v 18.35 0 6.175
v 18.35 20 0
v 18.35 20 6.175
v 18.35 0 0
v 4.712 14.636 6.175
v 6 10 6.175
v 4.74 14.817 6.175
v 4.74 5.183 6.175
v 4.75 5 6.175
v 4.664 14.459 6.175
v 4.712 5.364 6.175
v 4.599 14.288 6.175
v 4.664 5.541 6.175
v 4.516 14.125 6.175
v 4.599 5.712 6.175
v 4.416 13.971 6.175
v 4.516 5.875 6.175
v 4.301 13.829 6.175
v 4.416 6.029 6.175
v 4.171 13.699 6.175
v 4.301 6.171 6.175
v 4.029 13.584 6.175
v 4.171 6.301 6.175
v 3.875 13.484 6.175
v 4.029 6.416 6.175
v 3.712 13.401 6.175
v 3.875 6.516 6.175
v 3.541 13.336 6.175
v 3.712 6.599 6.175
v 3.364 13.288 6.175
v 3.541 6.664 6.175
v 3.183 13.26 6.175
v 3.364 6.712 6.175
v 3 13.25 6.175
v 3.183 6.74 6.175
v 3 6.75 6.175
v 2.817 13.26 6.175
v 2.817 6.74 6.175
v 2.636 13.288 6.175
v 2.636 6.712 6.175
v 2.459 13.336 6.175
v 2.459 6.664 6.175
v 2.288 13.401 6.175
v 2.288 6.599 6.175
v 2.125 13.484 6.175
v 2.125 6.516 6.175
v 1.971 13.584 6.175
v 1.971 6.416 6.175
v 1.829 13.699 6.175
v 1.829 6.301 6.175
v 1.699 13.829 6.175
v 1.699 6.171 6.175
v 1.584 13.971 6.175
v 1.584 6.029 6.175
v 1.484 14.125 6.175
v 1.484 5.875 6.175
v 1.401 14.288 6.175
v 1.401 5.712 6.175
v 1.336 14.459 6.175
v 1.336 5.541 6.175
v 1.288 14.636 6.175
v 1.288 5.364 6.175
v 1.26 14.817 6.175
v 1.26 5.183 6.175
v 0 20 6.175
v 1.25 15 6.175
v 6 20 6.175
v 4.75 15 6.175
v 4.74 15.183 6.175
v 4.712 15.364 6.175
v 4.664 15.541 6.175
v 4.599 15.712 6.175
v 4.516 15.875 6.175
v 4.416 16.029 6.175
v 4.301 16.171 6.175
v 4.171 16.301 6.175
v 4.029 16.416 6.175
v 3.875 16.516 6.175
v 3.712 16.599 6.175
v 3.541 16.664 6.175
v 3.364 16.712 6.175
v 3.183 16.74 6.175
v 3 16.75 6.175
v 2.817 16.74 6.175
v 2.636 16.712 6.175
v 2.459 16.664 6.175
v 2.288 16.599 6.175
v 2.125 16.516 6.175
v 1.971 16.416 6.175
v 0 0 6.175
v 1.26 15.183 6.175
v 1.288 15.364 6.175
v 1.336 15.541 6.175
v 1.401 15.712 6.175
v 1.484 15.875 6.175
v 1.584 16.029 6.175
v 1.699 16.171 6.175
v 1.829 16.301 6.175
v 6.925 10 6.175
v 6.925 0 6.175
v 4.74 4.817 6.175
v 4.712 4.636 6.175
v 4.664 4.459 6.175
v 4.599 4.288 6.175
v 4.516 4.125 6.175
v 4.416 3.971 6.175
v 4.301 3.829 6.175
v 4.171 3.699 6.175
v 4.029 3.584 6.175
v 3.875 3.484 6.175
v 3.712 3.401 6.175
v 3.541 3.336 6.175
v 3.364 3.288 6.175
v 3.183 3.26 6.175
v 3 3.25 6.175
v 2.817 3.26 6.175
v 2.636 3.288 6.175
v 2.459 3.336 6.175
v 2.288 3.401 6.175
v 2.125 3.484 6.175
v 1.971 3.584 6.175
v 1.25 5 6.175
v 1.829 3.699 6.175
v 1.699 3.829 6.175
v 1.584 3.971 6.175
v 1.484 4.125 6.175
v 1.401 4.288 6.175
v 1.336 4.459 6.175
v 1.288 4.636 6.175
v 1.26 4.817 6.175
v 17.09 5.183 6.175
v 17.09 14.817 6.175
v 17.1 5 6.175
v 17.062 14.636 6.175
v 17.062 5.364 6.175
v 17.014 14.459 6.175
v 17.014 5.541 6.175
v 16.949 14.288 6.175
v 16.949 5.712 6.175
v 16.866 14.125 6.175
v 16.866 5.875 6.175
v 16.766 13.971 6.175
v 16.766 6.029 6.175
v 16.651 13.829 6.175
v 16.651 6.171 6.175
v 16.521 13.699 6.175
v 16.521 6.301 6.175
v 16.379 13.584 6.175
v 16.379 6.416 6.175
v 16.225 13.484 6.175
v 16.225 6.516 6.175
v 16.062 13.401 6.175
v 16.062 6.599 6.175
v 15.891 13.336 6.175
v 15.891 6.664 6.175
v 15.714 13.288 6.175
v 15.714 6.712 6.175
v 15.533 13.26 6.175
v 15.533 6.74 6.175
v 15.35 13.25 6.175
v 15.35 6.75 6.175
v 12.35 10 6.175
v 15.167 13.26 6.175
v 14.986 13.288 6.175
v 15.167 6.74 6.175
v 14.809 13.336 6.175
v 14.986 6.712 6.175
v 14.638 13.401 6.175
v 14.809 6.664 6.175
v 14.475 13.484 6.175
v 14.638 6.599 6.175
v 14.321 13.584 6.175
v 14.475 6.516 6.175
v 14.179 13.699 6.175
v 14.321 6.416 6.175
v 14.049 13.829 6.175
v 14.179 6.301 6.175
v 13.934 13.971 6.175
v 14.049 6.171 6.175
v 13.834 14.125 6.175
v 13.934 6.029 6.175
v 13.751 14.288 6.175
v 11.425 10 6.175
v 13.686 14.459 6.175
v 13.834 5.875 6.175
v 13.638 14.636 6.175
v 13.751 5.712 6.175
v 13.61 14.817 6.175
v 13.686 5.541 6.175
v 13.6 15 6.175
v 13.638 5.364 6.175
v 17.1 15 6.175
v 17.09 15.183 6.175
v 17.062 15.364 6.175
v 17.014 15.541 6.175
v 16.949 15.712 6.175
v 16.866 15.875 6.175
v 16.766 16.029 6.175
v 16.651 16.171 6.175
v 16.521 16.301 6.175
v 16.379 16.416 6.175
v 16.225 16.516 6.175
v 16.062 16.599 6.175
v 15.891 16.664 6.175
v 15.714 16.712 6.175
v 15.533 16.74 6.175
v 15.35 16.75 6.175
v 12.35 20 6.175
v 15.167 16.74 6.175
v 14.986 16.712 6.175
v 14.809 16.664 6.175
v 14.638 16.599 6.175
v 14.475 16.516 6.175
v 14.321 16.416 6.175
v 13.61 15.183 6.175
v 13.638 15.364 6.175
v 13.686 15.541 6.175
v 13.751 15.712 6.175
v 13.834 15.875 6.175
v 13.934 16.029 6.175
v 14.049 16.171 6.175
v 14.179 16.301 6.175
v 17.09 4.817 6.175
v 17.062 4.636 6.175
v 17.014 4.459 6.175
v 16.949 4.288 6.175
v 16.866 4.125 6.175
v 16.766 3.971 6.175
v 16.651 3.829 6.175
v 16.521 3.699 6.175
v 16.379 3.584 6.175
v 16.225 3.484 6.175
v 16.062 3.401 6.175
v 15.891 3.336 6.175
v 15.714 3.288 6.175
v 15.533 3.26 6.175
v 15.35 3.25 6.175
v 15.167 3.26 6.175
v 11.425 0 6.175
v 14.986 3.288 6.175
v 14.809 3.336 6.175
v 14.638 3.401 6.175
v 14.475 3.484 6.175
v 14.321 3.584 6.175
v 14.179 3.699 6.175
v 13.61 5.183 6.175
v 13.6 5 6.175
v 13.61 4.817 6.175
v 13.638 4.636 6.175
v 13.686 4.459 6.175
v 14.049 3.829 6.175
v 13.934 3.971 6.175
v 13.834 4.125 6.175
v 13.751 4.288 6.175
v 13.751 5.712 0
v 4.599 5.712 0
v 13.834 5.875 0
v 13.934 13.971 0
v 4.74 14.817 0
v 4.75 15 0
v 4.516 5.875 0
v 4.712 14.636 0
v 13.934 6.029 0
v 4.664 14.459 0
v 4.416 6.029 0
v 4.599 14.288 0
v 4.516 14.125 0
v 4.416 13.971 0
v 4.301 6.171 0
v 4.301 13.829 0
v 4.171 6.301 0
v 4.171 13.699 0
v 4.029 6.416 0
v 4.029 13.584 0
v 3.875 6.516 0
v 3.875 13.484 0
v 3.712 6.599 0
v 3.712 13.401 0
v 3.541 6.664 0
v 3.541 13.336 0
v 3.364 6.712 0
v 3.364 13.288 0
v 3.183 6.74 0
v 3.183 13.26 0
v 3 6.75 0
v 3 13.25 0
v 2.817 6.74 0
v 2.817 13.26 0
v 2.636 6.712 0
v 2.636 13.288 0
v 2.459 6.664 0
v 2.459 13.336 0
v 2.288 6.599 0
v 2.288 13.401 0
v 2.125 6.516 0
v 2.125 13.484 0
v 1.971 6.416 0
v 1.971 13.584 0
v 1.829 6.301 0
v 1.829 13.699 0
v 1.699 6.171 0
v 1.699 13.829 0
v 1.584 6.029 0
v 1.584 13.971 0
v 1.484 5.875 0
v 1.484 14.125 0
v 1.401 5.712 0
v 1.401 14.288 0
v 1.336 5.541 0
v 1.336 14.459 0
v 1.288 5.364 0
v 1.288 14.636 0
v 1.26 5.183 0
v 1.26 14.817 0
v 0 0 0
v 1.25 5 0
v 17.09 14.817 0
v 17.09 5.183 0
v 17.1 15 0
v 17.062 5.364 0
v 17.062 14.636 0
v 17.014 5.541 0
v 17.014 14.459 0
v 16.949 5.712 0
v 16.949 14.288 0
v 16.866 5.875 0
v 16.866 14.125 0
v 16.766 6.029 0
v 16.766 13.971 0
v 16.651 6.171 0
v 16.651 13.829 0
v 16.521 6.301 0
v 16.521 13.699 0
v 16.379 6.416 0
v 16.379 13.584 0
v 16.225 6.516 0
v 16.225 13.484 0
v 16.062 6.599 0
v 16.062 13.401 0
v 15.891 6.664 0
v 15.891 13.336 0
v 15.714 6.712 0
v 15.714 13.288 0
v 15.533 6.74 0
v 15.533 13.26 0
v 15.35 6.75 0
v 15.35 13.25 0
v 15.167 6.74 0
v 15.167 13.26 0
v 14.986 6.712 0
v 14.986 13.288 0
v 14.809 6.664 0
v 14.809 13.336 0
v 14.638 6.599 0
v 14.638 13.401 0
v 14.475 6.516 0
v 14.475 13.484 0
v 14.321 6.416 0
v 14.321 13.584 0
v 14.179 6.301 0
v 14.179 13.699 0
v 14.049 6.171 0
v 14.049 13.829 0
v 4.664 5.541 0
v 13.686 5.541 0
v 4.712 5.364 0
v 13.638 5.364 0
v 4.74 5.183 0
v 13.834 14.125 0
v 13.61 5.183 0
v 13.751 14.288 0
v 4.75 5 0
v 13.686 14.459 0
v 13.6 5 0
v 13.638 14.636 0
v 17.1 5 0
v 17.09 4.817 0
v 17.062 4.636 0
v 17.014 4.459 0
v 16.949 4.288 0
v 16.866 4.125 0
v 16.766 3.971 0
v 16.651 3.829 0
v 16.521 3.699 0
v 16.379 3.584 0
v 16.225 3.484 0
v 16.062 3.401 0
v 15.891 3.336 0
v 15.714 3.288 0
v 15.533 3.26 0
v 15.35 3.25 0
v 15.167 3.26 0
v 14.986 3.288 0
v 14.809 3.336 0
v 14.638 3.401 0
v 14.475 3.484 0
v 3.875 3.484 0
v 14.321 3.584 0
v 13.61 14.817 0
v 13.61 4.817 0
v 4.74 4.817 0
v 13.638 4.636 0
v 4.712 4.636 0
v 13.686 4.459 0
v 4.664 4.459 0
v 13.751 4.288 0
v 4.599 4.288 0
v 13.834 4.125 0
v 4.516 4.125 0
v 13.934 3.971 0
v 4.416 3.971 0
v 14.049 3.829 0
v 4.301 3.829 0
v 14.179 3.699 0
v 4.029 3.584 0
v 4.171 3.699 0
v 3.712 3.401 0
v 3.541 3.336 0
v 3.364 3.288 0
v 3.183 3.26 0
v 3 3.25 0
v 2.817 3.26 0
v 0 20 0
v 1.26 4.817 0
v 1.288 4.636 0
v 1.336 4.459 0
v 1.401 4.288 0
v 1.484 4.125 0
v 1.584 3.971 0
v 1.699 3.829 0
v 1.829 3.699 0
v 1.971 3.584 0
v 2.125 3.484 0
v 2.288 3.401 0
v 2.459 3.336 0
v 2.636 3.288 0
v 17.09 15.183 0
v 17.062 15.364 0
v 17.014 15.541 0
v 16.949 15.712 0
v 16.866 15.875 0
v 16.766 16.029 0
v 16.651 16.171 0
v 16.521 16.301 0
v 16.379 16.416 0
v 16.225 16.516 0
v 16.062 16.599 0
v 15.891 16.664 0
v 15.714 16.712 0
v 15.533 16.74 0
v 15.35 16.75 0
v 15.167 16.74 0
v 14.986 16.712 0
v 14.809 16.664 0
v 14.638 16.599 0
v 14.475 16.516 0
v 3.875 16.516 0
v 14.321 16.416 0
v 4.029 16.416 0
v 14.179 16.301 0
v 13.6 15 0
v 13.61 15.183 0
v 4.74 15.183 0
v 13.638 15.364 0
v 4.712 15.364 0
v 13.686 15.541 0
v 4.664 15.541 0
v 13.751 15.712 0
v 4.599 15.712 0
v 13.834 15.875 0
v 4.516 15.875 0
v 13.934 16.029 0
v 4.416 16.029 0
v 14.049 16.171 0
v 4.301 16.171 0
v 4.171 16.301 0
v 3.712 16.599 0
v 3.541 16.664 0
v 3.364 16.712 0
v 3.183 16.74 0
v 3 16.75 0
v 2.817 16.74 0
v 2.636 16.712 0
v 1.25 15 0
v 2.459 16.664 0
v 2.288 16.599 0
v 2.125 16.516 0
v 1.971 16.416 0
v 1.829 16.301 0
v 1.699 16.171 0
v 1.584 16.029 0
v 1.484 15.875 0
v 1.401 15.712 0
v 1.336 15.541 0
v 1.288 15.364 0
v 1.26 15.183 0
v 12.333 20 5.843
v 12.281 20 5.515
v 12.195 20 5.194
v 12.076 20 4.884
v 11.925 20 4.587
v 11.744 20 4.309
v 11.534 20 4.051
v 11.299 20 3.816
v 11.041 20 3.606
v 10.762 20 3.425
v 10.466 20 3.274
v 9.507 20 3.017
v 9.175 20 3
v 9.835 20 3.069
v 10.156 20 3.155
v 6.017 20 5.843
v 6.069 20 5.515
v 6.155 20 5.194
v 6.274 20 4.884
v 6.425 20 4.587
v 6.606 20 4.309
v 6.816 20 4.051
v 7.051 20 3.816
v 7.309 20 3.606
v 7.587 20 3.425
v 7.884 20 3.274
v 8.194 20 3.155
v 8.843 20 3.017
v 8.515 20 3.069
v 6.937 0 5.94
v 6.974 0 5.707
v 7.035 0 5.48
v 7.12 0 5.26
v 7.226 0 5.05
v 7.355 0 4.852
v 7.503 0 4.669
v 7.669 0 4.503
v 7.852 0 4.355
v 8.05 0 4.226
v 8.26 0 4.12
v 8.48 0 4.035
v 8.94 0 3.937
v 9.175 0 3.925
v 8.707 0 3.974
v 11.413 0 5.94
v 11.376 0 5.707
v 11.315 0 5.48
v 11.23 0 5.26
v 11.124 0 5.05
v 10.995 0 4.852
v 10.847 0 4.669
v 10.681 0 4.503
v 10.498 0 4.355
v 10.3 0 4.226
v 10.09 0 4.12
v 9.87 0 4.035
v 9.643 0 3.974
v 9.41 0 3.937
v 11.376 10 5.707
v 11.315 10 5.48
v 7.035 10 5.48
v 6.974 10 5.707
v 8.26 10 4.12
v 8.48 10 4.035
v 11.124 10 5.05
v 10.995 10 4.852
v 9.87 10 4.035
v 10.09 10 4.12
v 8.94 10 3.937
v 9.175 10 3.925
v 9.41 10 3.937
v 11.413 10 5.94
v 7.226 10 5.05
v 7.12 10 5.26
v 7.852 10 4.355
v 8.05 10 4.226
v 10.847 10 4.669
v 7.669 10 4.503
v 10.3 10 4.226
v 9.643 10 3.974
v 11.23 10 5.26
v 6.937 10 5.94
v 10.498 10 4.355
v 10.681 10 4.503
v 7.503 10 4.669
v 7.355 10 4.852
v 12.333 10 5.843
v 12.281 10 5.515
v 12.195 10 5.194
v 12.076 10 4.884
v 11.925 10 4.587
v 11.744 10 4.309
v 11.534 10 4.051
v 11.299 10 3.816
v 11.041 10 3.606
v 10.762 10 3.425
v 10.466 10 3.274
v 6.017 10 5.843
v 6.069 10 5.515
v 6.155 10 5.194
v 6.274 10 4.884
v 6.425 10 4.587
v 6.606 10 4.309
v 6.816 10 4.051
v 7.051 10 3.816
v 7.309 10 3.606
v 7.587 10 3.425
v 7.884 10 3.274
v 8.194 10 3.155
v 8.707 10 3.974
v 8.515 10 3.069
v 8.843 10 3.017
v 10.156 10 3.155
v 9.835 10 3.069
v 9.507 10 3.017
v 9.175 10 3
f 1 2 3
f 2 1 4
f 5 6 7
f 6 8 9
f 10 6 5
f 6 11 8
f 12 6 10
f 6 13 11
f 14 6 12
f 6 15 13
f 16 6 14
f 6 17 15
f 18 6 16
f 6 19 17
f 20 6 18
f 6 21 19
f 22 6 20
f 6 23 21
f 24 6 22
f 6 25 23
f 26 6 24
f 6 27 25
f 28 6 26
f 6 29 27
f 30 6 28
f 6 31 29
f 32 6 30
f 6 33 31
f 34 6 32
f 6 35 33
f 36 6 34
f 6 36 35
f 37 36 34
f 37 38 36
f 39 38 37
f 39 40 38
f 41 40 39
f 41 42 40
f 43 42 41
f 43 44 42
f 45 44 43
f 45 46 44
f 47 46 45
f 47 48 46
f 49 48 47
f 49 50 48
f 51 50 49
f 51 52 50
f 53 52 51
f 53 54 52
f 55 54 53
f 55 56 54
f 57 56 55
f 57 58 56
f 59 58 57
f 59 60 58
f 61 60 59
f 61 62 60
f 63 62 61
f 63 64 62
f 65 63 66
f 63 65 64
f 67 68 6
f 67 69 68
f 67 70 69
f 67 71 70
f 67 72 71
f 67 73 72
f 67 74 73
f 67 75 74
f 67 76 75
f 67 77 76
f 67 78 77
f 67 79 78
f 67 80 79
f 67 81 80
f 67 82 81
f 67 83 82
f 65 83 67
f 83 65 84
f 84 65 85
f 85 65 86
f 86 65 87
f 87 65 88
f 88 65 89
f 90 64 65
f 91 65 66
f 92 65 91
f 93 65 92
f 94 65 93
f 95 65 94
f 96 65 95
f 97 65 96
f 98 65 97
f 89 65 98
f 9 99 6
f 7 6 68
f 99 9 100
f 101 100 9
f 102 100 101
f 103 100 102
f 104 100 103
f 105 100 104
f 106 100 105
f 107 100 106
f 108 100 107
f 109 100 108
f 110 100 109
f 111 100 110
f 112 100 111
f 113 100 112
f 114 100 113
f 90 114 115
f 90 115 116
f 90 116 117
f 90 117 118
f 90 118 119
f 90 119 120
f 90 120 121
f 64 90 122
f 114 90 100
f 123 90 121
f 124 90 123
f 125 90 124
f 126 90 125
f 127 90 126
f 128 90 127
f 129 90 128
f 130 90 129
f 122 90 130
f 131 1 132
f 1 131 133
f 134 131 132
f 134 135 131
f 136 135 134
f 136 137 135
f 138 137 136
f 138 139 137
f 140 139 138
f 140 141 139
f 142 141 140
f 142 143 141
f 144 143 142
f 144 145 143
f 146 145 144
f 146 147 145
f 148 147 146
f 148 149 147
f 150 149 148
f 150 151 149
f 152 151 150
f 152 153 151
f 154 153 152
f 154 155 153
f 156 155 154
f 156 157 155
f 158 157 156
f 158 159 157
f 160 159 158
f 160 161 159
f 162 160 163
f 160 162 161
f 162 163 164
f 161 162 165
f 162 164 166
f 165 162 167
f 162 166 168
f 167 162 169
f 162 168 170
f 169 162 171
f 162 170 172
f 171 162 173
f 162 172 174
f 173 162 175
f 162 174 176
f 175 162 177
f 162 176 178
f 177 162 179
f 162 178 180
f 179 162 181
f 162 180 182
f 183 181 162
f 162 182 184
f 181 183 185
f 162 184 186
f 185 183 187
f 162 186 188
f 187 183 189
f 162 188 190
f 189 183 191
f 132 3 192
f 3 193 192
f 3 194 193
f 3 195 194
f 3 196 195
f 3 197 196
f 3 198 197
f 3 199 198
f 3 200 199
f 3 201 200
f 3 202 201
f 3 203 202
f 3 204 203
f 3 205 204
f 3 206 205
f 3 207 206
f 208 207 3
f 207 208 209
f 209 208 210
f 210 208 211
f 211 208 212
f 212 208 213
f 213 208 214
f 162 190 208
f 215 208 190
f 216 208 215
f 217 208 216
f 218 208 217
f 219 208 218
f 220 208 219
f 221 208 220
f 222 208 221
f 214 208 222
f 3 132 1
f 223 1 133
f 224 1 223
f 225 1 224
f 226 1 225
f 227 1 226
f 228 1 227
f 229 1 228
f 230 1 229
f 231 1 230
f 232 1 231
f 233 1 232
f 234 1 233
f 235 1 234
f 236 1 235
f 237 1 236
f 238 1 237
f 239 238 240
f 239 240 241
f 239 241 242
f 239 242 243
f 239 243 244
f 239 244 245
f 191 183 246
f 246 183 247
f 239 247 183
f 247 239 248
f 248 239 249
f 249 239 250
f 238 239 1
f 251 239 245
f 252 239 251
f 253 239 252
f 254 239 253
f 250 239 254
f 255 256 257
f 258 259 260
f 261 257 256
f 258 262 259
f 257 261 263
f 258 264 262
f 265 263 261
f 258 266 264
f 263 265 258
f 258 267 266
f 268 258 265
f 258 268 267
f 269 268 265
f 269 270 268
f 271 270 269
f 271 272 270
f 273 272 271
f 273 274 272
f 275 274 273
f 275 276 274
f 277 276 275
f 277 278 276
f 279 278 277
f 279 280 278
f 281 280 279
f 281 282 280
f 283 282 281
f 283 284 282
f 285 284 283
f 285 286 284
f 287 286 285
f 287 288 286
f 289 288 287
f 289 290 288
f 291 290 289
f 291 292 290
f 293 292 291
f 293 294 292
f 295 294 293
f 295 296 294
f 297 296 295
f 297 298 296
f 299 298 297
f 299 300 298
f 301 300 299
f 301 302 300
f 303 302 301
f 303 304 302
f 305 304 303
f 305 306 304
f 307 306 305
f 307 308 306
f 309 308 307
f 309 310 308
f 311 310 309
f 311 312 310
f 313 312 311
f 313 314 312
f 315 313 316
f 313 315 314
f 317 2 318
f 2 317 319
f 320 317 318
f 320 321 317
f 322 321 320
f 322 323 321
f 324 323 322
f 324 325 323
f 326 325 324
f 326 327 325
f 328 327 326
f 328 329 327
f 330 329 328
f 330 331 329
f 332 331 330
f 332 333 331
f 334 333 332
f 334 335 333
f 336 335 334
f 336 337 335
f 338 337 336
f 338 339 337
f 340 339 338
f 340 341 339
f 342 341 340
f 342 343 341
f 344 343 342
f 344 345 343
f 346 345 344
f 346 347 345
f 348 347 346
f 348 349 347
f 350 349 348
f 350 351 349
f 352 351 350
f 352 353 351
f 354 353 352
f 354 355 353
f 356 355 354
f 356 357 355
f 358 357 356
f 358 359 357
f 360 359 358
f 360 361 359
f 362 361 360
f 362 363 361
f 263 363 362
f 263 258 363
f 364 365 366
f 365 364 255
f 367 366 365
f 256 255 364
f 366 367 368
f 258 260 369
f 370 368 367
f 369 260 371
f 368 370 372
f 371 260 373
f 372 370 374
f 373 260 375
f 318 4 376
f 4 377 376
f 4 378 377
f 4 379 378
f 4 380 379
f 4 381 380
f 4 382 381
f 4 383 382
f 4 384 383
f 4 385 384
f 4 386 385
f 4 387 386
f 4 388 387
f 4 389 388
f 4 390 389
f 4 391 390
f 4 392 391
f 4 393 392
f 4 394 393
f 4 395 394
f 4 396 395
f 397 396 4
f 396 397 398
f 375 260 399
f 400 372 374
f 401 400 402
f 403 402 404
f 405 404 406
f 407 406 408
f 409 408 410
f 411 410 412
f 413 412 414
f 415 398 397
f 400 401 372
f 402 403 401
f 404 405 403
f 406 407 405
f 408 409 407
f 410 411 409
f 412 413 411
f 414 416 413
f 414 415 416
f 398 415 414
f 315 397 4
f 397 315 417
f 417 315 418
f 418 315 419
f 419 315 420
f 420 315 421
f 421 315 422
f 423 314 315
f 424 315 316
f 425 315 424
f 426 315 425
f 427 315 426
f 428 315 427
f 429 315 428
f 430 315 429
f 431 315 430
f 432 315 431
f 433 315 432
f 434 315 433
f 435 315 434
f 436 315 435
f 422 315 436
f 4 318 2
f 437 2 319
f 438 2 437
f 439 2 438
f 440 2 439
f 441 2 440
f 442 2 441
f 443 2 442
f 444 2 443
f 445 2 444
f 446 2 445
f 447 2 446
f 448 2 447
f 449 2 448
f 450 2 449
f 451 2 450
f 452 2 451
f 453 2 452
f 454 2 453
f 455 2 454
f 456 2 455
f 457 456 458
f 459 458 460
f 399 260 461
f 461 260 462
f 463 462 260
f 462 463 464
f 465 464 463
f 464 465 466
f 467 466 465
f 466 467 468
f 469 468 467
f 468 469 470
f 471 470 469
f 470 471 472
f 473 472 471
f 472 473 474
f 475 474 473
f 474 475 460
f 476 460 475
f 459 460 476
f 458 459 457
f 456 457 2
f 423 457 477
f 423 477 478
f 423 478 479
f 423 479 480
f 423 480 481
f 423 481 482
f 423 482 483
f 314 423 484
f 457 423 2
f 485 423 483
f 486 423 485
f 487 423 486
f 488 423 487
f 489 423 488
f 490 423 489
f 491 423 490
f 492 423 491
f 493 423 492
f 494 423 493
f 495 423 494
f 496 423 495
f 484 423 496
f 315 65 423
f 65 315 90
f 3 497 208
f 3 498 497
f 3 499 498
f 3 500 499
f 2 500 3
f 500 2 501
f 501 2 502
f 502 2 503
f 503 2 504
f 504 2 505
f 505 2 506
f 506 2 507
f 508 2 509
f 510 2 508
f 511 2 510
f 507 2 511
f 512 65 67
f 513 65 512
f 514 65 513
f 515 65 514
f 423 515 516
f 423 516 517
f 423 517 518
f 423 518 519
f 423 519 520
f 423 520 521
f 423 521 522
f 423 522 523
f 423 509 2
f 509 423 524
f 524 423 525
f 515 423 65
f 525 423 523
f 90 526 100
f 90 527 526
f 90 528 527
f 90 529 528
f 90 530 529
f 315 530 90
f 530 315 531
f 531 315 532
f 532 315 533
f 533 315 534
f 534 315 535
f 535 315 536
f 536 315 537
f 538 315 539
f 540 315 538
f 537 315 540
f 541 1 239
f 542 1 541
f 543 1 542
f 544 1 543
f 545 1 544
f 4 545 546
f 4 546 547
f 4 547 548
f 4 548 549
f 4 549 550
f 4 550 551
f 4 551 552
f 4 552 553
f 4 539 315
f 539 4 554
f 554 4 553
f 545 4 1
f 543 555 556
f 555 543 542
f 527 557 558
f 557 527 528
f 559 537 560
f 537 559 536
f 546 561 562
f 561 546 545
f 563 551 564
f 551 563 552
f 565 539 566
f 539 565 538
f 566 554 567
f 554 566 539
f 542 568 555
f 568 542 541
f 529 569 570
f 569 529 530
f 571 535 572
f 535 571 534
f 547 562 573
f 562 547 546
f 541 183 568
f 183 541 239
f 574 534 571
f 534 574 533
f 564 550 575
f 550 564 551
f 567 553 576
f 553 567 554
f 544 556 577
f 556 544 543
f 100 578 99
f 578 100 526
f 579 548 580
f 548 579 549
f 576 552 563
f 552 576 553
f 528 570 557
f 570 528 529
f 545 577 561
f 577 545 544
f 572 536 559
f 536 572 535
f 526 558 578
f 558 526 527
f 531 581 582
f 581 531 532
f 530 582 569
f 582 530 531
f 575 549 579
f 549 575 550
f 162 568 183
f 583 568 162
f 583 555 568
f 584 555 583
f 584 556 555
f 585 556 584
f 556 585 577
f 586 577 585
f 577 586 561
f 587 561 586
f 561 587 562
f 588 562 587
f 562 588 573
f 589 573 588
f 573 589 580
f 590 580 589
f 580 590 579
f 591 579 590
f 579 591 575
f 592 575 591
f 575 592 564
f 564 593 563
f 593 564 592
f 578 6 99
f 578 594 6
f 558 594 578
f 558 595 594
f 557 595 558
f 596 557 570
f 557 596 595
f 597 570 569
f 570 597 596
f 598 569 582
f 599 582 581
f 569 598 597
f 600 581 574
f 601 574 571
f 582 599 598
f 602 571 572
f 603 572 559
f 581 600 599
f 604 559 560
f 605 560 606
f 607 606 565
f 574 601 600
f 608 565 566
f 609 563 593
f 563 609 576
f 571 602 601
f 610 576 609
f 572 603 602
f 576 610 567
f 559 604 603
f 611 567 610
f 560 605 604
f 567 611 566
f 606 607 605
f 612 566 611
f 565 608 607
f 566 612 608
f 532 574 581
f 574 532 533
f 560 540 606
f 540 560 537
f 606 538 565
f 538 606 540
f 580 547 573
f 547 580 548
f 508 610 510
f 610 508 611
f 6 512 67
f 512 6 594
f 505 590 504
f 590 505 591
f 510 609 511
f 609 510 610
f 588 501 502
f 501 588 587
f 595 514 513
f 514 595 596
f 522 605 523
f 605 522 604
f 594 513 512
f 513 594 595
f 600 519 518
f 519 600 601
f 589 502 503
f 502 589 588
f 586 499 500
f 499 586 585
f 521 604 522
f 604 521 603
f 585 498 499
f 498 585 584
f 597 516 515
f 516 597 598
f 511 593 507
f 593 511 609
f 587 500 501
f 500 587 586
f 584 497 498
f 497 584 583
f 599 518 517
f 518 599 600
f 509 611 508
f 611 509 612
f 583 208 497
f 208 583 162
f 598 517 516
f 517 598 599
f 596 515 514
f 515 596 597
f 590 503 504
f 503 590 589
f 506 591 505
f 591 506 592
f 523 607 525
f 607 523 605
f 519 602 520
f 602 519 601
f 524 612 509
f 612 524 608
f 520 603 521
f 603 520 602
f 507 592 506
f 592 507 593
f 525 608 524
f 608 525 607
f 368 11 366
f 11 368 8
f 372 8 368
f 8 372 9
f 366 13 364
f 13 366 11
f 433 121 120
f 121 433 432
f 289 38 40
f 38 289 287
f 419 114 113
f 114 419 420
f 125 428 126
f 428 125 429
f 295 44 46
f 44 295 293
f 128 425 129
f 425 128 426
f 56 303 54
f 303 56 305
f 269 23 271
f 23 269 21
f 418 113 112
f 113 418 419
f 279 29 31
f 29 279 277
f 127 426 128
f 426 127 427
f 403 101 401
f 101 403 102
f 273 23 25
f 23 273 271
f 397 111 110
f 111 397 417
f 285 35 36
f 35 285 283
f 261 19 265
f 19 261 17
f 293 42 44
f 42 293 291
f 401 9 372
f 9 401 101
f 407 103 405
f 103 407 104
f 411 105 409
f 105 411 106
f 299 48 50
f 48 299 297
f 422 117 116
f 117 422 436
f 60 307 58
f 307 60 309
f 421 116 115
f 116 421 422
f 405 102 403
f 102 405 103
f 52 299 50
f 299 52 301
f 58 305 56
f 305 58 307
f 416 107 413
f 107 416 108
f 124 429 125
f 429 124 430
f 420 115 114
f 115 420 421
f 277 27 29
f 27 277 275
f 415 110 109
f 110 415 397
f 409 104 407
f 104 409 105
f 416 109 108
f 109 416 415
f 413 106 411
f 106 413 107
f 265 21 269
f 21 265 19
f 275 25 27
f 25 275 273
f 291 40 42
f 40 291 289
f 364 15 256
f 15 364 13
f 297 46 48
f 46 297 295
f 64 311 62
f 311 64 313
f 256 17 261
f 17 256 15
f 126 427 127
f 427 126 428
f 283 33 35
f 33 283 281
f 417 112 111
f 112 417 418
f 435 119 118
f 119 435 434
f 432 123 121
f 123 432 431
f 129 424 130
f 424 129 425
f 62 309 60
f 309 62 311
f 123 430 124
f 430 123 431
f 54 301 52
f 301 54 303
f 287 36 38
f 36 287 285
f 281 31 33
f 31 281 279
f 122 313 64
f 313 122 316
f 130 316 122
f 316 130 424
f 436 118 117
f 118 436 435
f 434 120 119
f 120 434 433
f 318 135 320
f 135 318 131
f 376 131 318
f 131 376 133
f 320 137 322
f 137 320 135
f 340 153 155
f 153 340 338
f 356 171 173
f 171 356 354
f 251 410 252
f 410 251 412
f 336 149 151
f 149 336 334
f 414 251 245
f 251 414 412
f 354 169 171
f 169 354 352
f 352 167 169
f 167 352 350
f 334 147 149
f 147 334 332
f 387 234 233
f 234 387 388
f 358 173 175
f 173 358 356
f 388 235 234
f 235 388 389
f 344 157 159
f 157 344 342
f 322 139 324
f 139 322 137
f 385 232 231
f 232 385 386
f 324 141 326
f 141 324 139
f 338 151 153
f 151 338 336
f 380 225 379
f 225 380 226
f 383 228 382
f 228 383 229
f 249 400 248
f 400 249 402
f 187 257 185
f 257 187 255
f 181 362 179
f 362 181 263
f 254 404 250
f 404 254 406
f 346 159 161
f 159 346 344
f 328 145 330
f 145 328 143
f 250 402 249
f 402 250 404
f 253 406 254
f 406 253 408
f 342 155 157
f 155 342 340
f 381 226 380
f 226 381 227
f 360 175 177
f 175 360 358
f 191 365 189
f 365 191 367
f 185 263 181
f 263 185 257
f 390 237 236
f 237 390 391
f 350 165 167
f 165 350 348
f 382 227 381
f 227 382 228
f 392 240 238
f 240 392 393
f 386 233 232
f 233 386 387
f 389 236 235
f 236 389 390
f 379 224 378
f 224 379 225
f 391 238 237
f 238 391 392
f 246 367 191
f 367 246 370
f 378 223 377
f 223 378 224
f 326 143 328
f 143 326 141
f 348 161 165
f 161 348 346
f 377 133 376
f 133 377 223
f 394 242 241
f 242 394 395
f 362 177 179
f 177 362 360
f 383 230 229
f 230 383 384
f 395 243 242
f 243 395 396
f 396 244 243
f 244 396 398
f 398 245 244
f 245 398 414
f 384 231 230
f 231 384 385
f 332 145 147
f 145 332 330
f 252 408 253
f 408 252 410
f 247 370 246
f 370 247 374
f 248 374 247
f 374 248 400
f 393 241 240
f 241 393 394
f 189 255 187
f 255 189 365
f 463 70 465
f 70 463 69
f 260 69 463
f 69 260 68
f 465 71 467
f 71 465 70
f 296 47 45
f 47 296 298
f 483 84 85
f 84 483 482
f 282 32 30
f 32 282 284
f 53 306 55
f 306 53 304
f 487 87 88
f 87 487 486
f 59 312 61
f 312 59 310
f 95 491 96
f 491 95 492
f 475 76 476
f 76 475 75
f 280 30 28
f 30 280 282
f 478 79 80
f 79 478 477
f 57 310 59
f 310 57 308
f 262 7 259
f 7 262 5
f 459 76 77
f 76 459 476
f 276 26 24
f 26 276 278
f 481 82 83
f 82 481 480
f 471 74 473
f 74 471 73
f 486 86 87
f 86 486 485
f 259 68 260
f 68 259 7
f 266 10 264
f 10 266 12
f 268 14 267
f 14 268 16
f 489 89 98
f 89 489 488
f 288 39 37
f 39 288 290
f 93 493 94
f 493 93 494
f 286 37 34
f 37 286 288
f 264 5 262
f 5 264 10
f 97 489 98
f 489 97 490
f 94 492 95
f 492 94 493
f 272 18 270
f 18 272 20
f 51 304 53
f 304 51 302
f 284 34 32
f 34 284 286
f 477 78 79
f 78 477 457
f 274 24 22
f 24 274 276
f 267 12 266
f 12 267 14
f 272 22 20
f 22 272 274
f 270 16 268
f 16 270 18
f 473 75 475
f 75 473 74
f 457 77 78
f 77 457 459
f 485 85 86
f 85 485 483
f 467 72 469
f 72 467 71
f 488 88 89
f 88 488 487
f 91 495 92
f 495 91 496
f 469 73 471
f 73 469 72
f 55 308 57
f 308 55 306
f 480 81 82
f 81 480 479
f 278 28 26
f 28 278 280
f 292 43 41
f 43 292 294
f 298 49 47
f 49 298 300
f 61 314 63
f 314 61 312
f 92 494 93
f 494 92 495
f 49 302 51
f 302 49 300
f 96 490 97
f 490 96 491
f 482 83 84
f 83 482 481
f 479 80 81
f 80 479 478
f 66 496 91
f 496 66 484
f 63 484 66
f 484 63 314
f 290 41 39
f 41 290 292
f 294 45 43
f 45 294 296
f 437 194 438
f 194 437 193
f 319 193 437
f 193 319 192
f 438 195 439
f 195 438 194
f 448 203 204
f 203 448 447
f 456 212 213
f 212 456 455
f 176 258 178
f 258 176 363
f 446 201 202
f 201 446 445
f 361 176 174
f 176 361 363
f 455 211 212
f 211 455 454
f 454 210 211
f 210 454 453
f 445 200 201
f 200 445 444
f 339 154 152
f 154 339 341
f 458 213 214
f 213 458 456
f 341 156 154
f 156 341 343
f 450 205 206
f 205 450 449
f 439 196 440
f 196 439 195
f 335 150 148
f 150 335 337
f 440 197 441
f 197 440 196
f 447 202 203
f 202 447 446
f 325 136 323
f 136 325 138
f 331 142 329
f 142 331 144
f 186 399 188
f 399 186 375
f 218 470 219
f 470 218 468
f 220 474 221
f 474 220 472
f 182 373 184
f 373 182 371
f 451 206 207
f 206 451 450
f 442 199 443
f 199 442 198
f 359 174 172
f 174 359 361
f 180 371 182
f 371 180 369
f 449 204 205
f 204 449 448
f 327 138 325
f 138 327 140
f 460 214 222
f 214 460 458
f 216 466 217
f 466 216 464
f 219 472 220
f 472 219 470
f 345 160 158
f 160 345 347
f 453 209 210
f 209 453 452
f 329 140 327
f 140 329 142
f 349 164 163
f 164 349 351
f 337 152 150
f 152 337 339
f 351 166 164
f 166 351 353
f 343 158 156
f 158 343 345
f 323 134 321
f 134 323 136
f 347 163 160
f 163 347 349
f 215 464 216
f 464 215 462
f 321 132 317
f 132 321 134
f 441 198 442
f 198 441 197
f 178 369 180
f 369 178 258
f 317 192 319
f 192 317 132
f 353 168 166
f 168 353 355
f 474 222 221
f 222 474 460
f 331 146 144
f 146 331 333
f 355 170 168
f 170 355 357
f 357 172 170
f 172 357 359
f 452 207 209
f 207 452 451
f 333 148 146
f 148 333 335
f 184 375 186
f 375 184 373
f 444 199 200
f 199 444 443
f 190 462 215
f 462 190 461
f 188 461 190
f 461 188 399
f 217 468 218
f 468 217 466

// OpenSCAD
/*
 * MF70 shaft coupling
 *
 * Copyright 2012 <b@Zi.iS>
 * License CC BY 3.0
 */

$fn = 60;

m3 = 3.5 /2;

coupling_half();

module coupling_half(length = 20, clearence = 6, shaftA=4.5/2, shaftB=6.35/2, bolt=m3) {
	width = (max(shaftA, shaftB)+ clearence)*2;
	height = max(shaftA, shaftB) + clearence/2;
	difference() {
		cube([
			width,
			length,
			height
		]);
		translate([
			width/2,
			length/2,
			height
		]) {
			rotate([
				90,
				0,
				0
			]) {
				cylinder(
					r=shaftA,
					h=length/2+1
				);
			}
		}
		translate([
			width/2,
			length+1,
			height
		]) {
			rotate([
				90,
				0,
				0
			]) {
				cylinder(
					r=shaftB,
					h=length/2+1
				);
			}
		}
		translate([
			clearence/2,
			length/4,
			-1
		]) {
			cylinder(
				r=bolt,
				h=height+2
			);
		}
		translate([
			width-clearence/2,
			length/4,
			-1
		]) {
			cylinder(
				r=bolt,
				h=height+2
			);
		}
		translate([
			clearence/2,
			length/4*3,
			-1
		]) {
			cylinder(
				r=bolt,
				h=height+2
			);
		}
		translate([
			width-clearence/2,
			length/4*3,
			-1
		]) {
			cylinder(
				r=bolt,
				h=height+2
			);
		}
	}
}
